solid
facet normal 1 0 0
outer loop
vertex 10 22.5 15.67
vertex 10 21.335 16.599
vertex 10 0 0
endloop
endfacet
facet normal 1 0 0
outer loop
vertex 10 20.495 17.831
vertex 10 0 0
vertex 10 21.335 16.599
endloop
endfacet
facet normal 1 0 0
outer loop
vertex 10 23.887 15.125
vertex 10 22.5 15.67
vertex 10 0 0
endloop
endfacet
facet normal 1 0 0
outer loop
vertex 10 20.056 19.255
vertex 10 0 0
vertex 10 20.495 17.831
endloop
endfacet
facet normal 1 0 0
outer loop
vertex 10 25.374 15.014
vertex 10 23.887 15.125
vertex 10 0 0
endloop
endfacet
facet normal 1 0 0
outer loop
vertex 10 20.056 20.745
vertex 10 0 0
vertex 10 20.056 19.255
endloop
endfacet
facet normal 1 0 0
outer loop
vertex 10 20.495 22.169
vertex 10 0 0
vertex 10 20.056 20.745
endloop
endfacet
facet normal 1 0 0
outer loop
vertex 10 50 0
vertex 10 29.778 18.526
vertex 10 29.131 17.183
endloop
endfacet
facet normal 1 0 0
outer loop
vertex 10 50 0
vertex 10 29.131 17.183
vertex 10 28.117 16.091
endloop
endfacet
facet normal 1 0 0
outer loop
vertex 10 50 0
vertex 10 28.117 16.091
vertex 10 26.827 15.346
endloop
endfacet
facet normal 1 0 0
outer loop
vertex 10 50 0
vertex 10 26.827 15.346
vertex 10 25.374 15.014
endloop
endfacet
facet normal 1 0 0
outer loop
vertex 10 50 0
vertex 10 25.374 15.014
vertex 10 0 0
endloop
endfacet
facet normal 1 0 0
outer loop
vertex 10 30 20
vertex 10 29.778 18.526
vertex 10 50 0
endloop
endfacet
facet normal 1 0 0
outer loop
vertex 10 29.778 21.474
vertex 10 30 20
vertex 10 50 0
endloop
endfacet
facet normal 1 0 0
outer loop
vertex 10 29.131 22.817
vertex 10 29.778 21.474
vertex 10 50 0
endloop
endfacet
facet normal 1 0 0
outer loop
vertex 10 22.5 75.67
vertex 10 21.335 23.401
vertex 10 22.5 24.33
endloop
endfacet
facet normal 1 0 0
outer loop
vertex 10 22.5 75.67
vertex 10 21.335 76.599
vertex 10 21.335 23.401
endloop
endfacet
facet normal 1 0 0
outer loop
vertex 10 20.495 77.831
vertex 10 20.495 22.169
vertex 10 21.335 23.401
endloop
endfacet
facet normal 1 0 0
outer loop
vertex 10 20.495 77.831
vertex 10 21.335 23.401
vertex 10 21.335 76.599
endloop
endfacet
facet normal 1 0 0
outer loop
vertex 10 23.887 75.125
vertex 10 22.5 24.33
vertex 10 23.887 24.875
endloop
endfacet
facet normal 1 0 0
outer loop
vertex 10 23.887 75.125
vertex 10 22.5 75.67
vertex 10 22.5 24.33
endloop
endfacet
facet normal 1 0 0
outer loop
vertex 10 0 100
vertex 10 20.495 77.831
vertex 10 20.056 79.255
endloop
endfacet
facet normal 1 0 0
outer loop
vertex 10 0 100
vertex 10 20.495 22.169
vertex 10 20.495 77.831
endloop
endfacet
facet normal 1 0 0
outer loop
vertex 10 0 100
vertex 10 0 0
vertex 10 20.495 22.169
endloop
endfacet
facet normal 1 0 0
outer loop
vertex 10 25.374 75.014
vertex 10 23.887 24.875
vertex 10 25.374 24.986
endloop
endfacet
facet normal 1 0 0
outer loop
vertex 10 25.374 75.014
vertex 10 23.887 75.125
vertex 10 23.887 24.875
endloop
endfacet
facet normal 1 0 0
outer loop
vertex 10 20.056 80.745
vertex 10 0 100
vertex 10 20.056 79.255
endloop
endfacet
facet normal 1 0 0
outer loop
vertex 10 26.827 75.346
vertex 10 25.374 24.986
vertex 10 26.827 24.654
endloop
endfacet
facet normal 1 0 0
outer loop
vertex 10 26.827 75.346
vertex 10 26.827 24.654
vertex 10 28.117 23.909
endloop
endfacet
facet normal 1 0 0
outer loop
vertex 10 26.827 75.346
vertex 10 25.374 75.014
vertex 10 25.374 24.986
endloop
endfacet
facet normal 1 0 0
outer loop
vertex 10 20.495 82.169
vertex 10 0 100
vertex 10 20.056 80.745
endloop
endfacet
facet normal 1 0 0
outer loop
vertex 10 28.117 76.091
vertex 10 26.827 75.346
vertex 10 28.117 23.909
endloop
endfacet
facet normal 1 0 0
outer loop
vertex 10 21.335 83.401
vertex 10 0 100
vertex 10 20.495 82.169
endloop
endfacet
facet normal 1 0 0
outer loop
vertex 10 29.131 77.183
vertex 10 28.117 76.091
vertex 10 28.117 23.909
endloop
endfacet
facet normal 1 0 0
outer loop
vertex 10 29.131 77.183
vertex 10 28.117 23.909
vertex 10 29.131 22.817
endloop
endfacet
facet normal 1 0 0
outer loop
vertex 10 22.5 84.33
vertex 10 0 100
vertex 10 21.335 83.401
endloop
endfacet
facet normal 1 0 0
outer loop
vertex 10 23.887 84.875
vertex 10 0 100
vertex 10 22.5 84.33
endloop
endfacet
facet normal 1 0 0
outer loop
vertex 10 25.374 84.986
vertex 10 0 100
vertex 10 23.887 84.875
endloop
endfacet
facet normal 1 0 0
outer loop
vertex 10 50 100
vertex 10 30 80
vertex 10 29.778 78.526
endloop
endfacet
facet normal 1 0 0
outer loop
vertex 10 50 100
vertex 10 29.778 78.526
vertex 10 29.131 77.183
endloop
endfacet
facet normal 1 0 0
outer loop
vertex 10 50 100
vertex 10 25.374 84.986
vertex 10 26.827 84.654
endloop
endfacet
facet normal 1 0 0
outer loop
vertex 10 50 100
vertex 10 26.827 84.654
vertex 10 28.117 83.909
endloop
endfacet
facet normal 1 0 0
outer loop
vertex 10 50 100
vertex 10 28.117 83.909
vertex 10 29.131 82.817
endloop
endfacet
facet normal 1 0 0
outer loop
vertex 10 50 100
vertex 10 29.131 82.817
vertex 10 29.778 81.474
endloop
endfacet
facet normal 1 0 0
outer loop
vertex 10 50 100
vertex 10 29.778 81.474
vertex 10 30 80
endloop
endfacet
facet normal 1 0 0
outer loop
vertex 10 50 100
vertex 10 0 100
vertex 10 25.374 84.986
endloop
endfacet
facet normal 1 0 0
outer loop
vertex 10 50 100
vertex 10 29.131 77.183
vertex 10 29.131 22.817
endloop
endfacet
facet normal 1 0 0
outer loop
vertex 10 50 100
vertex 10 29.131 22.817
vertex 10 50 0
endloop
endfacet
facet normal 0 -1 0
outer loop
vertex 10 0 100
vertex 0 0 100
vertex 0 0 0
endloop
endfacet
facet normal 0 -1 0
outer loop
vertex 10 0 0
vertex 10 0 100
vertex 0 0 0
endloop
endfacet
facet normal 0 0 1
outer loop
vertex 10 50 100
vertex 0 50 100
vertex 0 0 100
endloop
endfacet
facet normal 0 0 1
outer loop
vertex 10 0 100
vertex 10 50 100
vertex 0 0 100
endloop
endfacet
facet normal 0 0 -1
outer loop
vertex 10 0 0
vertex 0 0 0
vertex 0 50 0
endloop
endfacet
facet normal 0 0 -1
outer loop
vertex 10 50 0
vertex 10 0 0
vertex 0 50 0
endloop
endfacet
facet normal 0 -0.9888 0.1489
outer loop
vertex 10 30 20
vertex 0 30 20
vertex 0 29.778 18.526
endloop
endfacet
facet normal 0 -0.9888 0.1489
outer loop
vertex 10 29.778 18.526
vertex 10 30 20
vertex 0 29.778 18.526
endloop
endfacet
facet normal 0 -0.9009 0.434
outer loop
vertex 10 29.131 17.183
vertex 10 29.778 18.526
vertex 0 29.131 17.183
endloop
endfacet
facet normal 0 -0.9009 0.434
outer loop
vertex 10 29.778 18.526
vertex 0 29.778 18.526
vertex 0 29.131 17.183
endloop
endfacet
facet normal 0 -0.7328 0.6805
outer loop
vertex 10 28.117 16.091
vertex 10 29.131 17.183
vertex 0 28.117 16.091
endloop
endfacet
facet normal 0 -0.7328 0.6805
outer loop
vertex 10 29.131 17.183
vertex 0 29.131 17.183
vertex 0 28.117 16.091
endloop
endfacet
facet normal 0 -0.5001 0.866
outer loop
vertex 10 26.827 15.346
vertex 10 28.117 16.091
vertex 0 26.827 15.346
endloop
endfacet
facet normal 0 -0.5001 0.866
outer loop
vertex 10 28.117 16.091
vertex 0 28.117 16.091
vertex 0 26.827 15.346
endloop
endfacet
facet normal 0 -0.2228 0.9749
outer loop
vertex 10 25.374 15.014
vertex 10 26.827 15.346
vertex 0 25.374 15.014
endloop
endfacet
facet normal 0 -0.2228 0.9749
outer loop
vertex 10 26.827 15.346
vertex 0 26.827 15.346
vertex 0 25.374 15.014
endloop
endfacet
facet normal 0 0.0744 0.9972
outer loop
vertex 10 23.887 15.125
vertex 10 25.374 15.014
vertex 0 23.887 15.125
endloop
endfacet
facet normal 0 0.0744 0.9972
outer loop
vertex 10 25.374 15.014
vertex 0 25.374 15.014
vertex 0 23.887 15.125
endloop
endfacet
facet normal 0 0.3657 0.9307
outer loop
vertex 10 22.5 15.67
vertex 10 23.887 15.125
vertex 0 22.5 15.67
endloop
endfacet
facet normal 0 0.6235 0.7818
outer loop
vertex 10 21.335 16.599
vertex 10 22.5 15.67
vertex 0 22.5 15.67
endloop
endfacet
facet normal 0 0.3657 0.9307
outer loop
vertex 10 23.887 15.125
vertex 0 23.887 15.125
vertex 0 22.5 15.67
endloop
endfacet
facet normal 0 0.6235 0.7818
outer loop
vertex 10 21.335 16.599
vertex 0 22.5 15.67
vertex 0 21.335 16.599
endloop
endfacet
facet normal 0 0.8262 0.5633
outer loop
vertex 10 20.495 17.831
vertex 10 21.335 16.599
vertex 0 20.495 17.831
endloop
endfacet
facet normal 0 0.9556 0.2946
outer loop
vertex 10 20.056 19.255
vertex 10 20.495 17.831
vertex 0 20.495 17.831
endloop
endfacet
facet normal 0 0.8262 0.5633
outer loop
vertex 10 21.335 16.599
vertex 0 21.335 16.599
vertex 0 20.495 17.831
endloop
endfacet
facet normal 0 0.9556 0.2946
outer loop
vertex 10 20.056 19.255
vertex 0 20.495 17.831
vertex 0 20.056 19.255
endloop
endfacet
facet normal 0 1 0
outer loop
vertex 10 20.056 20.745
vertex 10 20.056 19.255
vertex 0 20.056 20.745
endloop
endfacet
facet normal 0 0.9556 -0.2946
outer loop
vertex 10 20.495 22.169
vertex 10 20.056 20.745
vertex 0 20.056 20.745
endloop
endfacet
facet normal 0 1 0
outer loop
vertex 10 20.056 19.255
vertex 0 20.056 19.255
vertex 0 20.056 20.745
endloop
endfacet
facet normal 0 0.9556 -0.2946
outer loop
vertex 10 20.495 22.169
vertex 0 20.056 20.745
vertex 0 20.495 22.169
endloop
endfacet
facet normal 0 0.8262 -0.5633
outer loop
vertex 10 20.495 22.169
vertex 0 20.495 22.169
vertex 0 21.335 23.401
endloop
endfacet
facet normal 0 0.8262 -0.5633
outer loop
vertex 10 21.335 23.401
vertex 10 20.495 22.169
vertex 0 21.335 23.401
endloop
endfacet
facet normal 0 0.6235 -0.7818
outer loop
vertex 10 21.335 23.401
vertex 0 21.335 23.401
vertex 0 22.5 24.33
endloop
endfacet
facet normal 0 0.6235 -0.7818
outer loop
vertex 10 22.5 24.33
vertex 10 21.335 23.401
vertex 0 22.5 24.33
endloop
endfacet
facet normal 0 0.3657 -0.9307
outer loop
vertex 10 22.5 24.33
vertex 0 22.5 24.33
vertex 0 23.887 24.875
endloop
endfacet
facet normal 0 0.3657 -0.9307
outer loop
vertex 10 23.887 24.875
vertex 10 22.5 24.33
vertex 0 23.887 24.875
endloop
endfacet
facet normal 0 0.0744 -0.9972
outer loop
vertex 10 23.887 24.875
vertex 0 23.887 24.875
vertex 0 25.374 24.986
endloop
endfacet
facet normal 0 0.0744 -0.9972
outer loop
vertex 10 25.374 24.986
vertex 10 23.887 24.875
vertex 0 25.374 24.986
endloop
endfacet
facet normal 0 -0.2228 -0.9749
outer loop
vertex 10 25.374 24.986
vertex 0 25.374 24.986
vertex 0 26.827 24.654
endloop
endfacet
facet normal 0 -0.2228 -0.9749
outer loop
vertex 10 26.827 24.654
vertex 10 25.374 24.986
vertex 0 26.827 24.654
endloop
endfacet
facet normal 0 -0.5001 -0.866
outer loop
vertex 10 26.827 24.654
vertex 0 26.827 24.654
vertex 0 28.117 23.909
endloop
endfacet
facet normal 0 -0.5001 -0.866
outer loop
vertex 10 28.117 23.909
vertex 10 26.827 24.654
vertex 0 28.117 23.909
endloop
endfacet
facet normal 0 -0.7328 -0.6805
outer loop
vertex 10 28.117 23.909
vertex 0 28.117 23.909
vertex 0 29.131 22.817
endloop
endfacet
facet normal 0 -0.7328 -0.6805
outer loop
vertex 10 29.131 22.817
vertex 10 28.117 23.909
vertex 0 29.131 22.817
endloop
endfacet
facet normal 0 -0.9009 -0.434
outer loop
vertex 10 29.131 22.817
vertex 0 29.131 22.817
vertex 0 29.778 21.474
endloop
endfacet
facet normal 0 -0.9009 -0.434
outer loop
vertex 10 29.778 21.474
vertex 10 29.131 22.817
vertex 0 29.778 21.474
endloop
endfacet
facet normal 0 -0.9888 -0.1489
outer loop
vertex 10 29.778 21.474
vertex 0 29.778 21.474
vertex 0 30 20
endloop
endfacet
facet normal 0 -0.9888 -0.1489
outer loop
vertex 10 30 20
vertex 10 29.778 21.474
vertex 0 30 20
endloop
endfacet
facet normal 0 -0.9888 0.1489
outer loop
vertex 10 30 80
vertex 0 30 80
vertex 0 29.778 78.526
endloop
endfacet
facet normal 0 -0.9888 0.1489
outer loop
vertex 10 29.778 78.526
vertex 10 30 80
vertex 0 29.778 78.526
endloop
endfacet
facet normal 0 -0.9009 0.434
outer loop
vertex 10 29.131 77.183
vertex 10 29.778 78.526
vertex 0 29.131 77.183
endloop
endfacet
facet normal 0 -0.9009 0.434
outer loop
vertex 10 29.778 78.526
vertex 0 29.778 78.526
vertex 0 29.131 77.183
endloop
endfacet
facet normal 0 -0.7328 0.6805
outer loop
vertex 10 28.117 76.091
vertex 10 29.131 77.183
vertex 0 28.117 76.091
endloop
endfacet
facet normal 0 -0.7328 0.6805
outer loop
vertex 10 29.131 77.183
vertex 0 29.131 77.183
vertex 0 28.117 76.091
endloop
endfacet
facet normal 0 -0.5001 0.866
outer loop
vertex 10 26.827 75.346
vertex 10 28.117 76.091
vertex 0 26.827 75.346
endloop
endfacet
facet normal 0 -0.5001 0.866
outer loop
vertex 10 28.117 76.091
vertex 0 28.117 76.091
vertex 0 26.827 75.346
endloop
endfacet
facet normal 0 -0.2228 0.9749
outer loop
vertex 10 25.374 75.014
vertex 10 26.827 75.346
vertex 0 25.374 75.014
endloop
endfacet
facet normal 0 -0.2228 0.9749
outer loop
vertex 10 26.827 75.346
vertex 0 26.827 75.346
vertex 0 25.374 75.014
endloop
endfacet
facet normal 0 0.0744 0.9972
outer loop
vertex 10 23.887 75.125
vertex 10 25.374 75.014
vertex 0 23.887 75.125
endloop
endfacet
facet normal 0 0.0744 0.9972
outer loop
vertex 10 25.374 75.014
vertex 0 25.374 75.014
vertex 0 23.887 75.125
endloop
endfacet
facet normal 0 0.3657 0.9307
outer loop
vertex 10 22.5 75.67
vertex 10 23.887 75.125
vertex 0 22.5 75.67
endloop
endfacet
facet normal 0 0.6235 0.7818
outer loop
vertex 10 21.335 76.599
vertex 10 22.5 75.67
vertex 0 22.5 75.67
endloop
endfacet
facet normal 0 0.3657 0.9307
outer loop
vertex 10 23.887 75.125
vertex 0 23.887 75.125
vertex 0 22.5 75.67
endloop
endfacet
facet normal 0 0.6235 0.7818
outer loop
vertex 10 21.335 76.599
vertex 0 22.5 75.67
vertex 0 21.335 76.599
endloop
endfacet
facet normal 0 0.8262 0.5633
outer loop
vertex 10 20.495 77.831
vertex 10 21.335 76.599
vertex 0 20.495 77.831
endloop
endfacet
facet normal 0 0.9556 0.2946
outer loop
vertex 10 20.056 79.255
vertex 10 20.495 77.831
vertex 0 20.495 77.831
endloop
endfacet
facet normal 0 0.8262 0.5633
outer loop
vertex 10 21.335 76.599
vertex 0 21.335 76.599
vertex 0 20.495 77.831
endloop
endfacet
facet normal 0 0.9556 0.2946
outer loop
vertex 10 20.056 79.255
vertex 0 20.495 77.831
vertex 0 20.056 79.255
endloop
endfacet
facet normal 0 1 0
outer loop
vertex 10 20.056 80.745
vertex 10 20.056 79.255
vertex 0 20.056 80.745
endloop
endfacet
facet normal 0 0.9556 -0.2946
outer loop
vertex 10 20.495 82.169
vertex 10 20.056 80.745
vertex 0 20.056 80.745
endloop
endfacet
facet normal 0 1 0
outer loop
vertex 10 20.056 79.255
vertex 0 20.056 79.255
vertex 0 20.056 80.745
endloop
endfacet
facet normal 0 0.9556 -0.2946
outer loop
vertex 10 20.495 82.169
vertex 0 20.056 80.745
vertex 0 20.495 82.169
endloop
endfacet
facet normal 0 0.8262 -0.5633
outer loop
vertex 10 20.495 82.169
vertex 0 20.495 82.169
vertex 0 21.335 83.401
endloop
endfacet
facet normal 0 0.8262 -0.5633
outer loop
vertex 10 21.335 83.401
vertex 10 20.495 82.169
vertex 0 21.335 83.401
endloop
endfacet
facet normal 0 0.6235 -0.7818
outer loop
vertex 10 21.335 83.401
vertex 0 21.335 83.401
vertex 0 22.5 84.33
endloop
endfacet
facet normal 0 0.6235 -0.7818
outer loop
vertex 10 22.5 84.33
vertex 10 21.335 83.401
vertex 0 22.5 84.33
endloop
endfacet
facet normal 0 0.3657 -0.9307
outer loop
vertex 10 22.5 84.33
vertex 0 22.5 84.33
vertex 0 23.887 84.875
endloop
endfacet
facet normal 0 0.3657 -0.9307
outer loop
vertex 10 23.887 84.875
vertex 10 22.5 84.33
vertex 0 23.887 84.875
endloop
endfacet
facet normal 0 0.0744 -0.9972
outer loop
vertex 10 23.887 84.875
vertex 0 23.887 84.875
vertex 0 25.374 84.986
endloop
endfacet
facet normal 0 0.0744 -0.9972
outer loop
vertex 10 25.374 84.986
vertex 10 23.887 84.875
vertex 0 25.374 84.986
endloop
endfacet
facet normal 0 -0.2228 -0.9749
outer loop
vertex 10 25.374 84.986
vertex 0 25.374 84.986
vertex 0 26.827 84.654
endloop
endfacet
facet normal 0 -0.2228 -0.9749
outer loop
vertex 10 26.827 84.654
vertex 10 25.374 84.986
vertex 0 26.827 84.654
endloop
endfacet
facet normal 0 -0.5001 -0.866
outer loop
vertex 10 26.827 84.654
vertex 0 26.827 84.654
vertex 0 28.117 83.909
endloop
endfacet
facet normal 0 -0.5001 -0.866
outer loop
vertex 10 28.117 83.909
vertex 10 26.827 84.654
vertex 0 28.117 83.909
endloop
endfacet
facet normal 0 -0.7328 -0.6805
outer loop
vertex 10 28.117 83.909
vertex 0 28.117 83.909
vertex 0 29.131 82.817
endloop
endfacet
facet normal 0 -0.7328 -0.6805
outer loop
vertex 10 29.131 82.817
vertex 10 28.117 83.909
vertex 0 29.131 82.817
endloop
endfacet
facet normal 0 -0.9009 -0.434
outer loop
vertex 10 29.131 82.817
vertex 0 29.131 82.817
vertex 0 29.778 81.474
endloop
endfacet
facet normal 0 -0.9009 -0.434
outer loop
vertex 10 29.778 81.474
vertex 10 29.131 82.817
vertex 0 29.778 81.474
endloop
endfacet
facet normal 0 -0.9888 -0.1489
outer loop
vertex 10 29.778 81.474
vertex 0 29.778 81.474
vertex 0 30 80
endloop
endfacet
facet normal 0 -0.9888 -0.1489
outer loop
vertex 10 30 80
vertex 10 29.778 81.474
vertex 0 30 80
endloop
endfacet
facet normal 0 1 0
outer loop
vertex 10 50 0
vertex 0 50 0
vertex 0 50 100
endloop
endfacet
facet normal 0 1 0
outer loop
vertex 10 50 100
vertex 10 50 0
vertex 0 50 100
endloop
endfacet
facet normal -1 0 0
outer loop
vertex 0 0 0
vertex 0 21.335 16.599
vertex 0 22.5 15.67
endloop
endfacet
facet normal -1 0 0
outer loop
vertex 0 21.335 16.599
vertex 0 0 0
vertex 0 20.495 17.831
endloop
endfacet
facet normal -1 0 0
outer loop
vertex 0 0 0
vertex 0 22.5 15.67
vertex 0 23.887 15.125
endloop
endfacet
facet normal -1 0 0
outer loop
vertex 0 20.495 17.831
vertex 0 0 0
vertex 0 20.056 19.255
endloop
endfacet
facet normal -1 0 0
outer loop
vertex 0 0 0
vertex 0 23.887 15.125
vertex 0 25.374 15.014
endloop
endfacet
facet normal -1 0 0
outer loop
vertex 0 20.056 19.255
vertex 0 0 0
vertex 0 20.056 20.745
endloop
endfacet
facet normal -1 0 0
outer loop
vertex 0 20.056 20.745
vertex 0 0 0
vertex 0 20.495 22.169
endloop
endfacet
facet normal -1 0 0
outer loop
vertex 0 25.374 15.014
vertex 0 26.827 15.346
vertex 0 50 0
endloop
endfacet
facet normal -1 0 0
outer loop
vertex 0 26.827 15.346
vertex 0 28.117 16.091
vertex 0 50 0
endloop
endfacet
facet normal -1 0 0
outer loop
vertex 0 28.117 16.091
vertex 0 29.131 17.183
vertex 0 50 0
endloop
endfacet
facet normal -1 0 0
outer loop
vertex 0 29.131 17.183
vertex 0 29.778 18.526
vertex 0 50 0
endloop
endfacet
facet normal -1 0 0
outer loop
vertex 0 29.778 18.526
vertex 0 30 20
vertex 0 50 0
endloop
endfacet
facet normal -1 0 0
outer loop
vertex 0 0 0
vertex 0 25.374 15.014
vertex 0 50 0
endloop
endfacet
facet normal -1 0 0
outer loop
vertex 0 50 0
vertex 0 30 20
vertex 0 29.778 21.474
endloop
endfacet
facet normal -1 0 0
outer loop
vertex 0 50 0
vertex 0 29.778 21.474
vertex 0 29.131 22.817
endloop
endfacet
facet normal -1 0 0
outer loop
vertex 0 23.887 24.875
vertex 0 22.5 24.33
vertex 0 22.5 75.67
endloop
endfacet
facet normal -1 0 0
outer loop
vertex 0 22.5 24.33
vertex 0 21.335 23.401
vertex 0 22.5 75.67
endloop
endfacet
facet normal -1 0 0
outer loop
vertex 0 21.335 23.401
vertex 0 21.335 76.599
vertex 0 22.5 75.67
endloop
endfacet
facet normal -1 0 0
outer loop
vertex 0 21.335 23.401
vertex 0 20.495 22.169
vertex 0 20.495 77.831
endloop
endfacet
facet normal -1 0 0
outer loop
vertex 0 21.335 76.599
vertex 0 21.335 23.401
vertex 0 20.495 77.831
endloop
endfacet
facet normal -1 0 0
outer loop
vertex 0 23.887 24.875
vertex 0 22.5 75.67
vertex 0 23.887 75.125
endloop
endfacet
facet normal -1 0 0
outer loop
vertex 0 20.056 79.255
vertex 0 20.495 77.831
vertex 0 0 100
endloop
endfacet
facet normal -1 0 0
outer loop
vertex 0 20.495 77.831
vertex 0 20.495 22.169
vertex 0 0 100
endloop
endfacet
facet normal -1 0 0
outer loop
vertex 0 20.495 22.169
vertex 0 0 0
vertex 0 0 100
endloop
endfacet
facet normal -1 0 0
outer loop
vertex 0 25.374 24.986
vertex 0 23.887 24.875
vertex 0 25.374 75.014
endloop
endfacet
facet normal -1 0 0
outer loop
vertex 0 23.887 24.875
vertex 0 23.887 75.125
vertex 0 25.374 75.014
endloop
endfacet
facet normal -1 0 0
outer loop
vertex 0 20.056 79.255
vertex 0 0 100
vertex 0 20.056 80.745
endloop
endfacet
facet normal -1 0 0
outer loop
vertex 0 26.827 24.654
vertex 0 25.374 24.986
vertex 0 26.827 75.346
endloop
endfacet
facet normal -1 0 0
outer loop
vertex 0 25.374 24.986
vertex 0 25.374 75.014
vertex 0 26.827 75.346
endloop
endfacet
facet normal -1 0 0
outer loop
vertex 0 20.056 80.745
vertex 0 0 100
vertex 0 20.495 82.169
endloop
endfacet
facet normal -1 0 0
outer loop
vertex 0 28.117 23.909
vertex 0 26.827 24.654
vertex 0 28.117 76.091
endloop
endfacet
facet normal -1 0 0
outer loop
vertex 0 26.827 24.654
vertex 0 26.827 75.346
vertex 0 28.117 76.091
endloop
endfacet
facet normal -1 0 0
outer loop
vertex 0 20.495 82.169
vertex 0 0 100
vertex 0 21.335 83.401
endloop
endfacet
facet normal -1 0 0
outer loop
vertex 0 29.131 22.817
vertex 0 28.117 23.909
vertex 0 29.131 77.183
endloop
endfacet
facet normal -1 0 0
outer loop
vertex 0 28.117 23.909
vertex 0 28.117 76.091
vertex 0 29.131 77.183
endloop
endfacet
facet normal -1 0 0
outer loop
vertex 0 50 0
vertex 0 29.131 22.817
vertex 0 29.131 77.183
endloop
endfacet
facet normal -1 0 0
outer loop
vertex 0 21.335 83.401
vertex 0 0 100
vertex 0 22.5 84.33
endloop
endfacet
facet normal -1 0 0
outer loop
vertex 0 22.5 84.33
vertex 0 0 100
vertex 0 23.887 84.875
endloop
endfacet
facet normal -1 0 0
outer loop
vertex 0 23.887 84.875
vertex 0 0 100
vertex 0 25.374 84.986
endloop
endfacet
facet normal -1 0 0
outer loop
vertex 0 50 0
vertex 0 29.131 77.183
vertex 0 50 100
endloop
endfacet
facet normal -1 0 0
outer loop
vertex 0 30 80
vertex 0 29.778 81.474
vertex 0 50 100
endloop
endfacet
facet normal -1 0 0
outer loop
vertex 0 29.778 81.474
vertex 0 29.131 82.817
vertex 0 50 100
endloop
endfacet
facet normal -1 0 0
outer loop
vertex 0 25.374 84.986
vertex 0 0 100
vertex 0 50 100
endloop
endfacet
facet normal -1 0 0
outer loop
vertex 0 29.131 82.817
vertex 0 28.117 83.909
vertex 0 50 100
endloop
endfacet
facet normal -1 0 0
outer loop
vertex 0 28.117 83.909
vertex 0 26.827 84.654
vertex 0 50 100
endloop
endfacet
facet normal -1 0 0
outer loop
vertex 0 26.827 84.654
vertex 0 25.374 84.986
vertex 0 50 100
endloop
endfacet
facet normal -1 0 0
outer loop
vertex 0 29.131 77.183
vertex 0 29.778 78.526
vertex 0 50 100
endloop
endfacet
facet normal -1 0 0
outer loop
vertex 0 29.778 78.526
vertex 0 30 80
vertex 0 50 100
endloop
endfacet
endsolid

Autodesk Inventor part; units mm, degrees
ref_plane "YZ Plane" through (0, 0, 0) normal (1, 0, 0) x (0, 1, 0)
ref_plane "XZ Plane" through (0, 0, 0) normal (0, 1, 0) x (-1, 0, 0)
ref_plane "XY Plane" through (0, 0, 0) normal (0, 0, 1) x (1, 0, 0)
sketch "Sketch1" plane through (0, 0, 0) normal (1, 0, 0) x (0, 1, 0)
  line L0 (0, 0) -> (50, 0)
  line L1 (50, 0) -> (50, 100)
  line L2 (50, 100) -> (0, 100)
  line L3 (0, 100) -> (0, 0)
  line L4 (25, 108.4087) -> (25, -21.5037)
  circle A0 centre (25, 80) radius 5
  line L5 (63.0593, 50) -> (-7.0373, 50)
  circle A1 centre (25, 20) radius 5
  dimension "d0" = 100
  dimension "d1" = 50
  dimension "d4" = 25
  dimension "d5" = 20
  dimension "d6" = 50
  dimension "d9" = 10
extrude "Extrusion2" add sketch "Sketch1" along normal blind 10 contours L3 L5 L4 A1 L0 | L4 A1 L5 L1 L0 | L3 L2 L4 A0 L5 | L4 A0 L2 L1 L5
equation "\"d4\" = 0.5 * d1"
equation "\"d5\" = 0.2 * d0"
equation "\"d6\" = 0.5 * d0"
properties part number "block"
